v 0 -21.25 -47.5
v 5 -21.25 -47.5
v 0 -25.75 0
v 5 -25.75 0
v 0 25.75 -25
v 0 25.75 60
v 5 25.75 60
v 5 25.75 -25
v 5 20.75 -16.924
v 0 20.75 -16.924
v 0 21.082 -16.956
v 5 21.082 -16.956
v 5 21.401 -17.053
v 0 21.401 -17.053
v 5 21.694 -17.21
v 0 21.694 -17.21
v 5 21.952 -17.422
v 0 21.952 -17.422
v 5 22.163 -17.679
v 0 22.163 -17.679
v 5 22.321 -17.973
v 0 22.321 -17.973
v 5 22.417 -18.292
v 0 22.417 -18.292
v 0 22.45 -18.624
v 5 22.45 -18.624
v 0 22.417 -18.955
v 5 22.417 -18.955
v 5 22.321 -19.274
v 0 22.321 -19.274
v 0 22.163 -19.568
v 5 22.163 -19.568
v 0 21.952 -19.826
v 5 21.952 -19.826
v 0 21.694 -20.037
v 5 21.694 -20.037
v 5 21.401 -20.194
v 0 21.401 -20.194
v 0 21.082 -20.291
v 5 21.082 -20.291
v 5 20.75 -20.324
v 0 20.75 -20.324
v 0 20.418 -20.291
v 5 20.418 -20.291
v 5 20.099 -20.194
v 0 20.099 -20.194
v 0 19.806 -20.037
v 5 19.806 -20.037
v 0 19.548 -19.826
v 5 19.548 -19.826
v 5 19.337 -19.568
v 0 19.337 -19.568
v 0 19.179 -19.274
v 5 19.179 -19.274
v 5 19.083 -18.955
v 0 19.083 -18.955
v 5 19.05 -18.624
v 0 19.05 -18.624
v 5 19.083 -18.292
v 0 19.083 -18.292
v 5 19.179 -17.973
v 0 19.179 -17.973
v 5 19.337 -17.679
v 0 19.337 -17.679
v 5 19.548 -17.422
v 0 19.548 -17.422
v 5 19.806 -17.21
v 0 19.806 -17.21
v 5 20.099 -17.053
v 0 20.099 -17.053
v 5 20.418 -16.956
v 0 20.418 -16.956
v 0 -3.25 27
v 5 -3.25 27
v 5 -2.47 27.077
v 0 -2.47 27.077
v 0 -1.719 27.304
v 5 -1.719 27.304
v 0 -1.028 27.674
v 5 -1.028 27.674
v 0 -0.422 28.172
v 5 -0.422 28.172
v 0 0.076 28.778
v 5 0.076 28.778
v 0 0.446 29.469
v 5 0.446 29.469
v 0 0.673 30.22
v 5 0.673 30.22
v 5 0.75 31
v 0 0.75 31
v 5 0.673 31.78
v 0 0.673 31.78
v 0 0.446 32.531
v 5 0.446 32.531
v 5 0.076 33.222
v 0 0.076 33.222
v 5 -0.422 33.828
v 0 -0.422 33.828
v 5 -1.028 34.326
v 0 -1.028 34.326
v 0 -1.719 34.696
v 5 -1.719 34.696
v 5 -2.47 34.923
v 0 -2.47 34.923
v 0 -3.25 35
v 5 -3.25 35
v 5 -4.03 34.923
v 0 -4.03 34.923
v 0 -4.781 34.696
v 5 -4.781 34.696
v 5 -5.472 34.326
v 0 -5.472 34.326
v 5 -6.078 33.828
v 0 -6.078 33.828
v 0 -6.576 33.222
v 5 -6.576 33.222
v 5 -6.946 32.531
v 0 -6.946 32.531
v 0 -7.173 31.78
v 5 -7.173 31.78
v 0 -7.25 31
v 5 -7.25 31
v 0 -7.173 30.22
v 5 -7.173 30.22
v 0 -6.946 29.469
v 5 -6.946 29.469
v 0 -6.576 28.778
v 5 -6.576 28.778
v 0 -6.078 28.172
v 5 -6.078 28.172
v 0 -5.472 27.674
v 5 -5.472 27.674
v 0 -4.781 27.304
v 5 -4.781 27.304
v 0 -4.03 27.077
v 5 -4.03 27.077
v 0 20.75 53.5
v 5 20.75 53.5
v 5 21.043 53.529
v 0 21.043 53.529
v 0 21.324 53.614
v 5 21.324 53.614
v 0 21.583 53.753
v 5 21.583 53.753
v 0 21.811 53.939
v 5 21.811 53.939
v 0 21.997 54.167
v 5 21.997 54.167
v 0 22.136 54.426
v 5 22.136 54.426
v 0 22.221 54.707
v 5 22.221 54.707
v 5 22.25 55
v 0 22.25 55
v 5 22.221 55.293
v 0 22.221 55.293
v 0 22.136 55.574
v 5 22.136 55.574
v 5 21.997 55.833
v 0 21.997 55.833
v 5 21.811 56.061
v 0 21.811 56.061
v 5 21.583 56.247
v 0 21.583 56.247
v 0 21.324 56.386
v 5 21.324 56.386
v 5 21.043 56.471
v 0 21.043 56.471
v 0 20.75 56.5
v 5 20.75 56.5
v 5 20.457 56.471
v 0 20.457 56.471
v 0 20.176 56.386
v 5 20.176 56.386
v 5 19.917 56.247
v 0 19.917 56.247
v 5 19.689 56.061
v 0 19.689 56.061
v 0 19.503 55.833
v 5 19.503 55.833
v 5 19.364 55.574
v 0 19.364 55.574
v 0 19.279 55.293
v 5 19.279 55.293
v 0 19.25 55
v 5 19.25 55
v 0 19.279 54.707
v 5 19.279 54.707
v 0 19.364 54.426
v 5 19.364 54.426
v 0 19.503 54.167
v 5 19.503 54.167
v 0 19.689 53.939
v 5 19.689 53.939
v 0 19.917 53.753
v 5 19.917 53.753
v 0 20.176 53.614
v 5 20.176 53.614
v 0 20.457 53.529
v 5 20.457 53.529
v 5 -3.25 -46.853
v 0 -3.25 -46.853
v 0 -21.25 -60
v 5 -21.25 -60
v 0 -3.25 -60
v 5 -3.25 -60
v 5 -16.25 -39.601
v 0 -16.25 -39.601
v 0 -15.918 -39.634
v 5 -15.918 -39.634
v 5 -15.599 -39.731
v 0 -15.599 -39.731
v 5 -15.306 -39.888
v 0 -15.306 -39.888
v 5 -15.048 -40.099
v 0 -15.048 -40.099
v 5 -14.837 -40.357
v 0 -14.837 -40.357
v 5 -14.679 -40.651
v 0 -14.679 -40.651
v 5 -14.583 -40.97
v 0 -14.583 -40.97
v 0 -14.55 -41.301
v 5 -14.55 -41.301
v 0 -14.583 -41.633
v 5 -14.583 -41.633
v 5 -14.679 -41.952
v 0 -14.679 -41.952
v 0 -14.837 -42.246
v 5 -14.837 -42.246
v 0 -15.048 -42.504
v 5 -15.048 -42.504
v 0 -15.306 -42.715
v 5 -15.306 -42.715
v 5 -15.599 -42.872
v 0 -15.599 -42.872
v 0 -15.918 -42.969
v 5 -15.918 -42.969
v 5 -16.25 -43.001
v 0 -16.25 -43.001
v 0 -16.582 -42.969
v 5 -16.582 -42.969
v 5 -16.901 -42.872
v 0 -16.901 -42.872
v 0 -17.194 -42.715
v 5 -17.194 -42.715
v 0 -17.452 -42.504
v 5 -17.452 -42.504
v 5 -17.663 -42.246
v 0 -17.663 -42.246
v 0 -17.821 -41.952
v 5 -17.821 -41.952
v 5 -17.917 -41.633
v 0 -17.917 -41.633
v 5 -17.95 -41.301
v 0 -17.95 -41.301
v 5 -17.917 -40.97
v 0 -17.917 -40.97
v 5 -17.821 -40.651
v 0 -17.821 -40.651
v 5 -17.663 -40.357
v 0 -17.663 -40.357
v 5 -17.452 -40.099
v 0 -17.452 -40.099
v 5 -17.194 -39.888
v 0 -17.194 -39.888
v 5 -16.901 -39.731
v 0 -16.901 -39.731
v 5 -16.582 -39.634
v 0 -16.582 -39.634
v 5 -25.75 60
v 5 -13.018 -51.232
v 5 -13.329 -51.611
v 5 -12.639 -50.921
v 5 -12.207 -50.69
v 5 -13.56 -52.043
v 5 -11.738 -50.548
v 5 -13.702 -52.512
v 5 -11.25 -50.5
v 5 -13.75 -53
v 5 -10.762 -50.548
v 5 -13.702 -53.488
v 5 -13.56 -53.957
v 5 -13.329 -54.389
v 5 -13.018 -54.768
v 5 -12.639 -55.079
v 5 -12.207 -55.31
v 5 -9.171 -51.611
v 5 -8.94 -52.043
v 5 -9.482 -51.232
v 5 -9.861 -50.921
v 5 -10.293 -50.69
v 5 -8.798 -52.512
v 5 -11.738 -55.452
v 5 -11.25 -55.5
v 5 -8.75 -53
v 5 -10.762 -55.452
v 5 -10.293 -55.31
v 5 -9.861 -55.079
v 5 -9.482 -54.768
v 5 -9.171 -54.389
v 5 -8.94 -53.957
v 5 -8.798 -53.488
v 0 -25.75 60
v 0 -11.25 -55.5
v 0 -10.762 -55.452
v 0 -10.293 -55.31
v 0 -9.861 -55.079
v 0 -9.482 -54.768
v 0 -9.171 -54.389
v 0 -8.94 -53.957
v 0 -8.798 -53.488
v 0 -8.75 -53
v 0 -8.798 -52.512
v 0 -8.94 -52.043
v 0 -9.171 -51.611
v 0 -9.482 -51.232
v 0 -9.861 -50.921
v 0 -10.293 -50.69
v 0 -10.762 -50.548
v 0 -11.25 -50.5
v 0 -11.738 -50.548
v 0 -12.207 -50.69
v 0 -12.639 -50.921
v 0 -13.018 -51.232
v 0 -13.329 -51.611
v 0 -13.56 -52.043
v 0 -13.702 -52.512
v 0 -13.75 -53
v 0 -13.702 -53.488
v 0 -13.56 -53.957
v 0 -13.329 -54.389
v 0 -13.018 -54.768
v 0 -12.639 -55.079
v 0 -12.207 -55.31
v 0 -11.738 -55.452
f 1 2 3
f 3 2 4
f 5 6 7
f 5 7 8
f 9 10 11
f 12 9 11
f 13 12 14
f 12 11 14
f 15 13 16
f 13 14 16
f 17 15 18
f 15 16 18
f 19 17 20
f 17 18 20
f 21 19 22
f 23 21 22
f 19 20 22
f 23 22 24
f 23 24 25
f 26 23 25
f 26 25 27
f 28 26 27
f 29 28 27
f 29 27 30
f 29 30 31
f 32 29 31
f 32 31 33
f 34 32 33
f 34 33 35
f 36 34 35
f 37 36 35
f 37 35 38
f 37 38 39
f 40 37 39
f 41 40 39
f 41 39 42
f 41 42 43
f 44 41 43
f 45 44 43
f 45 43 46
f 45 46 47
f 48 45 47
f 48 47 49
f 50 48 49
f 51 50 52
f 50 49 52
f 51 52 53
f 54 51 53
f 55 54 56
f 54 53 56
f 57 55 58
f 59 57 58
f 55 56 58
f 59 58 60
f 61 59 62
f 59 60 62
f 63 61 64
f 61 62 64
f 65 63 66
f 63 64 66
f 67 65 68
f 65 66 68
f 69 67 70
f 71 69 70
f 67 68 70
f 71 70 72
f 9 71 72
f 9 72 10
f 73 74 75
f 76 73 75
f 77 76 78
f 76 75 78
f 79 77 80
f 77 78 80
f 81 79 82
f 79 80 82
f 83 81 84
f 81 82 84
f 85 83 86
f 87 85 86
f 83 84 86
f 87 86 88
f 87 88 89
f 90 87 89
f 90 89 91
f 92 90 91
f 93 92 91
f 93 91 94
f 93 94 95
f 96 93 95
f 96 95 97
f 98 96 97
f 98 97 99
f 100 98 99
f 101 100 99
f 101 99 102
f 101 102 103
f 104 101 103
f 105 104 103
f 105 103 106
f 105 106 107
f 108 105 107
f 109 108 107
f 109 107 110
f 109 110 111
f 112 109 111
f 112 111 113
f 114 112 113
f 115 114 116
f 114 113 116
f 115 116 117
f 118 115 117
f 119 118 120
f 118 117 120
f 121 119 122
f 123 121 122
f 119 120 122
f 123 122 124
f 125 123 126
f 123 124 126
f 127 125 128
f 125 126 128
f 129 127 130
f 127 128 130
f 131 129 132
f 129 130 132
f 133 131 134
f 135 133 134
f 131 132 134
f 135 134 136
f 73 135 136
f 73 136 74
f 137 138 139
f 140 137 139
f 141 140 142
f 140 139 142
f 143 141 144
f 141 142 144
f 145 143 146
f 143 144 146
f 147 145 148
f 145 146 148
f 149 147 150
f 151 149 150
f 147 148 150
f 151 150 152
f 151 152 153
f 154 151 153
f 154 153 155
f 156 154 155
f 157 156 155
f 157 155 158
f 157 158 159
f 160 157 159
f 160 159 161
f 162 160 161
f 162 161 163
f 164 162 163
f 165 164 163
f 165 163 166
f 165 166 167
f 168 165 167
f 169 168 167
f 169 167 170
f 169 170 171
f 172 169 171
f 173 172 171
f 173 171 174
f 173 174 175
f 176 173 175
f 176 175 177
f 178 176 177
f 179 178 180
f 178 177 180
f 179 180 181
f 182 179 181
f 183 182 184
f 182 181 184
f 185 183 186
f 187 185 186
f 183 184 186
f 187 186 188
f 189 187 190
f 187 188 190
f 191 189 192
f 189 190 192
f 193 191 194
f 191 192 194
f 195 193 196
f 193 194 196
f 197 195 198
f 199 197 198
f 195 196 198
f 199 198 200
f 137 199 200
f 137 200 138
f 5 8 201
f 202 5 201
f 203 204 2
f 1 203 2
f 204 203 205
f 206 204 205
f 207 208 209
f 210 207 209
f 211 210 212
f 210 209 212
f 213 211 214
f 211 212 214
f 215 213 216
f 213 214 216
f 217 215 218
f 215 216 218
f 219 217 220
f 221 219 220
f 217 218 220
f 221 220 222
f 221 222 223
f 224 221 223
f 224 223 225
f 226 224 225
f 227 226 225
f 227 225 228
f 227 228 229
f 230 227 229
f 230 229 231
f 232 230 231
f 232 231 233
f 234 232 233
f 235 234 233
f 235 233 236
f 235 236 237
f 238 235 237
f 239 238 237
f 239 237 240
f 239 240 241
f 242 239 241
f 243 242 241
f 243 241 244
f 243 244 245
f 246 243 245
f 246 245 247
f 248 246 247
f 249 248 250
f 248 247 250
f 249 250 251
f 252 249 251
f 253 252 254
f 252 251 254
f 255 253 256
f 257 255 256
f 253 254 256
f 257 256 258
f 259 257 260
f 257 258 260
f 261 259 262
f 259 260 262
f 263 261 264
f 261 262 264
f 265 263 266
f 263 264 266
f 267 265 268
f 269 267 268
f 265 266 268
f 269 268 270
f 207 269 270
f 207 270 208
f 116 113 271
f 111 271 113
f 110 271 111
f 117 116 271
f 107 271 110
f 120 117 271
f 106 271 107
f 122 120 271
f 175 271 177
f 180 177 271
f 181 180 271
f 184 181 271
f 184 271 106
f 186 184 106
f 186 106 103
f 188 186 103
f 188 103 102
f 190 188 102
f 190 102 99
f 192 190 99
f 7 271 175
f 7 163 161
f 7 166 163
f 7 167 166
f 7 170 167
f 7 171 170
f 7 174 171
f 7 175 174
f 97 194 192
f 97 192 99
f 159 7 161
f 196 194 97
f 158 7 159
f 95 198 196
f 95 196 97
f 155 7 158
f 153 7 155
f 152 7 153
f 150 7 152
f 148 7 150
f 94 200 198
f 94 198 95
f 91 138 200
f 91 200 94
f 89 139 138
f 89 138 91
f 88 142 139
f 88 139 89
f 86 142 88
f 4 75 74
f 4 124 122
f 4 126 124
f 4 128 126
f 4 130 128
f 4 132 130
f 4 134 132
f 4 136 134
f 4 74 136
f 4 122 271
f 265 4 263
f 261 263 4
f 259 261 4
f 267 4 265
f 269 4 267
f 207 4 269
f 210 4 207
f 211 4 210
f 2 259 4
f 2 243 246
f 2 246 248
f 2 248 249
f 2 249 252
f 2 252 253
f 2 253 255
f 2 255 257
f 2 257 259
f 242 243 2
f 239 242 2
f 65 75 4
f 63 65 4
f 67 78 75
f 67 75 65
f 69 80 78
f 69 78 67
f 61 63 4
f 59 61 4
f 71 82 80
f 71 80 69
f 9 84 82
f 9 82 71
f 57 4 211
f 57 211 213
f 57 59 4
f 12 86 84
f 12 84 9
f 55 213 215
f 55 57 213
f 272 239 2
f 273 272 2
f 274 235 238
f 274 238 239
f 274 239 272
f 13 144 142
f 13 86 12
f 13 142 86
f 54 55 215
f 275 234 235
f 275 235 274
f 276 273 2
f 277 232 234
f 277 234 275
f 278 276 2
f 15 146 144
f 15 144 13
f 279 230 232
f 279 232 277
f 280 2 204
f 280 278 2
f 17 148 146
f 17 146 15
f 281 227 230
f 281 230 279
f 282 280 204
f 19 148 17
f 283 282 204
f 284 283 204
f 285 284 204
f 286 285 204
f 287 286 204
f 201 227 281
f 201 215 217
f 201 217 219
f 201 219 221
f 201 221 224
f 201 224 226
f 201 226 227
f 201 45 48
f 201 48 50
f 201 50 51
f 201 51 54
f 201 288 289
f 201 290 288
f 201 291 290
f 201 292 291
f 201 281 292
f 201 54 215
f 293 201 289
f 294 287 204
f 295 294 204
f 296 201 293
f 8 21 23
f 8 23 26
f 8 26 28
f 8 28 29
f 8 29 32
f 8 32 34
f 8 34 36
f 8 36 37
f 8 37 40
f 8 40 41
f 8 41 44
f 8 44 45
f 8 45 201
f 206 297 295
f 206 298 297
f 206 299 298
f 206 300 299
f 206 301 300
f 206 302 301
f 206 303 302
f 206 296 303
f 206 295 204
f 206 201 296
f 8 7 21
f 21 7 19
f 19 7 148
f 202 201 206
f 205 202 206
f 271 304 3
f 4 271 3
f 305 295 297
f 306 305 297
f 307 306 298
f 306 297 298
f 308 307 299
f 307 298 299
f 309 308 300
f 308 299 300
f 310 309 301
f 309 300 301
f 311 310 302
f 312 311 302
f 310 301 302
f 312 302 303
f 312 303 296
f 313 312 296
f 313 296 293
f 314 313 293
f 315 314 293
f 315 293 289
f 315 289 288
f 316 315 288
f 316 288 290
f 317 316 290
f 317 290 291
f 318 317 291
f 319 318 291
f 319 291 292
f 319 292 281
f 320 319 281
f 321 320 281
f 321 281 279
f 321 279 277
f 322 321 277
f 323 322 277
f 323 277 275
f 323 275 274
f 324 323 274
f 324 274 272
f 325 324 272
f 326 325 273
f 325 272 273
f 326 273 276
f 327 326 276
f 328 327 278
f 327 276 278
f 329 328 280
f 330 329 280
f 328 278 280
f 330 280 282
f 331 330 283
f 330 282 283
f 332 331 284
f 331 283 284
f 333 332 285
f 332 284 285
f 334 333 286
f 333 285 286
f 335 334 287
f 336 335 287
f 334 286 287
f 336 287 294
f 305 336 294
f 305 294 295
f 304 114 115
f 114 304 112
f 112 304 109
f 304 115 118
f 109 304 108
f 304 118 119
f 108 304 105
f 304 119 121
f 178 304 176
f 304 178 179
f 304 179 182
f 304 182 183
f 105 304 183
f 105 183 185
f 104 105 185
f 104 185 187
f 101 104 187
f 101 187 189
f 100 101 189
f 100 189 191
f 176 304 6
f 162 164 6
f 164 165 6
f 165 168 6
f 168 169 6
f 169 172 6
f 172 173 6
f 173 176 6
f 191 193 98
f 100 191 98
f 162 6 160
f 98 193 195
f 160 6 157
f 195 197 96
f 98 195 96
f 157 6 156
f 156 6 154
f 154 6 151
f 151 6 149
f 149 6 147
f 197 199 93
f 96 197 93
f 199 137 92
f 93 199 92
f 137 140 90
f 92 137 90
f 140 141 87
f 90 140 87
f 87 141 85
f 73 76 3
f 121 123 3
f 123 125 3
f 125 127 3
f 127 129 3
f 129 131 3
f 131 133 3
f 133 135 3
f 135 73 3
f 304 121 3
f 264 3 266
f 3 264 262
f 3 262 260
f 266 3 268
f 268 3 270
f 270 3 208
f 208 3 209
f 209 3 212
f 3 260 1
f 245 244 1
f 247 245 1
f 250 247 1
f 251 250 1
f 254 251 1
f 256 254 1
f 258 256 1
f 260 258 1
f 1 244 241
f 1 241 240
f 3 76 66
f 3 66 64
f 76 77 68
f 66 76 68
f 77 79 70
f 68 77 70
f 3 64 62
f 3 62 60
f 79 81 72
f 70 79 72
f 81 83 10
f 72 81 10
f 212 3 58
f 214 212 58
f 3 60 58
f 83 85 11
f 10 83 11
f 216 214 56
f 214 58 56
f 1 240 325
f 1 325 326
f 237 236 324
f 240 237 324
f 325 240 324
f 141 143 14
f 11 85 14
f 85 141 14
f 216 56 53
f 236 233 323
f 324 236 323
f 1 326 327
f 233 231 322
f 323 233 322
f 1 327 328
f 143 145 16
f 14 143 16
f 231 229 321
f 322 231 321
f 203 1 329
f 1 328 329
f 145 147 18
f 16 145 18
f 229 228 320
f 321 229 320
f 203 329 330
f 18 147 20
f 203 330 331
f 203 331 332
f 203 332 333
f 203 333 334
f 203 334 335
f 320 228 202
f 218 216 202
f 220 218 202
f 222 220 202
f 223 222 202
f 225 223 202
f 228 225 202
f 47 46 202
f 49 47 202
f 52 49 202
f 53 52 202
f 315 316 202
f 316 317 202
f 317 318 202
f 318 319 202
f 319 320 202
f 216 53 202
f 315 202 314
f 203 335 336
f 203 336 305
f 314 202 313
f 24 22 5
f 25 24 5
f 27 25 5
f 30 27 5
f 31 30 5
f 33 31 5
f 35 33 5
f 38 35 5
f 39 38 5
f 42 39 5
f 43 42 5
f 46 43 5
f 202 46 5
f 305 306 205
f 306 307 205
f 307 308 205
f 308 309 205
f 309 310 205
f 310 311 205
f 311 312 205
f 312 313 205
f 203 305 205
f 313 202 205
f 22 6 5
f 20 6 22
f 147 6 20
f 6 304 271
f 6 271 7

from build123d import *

# Parameters (mm, degrees)
CROQUIS1_W              = 120
CROQUIS1_H              = 51.5
SALIENTE_EXTRUIR1_DEPTH = 5
CORTAR_EXTRUIR1_REACH   = 7
CORTAR_EXTRUIR2_REACH   = 7
CROQUIS3_R              = 1.5
CROQUIS3_R_2            = 4
CORTAR_EXTRUIR3_REACH   = 7
CROQUIS4_R              = 1.7
CORTAR_EXTRUIR4_REACH   = 7
CROQUIS9_R              = 2.5
CORTAR_EXTRUIR8_DEPTH   = 10


with BuildPart() as part:
    # Croquis1 → Saliente-Extruir1 (new body)
    with BuildSketch(Plane(origin=(0, 0, 0), x_dir=(0, 0, -1), z_dir=(1, 0, 0))):
        Rectangle(CROQUIS1_W, CROQUIS1_H)
    extrude(amount=SALIENTE_EXTRUIR1_DEPTH)

    # Croquis2 → Cortar-Extruir1 (cut, up to next)
    with BuildSketch(Plane(origin=(5, 0, 0), x_dir=(0, 0, -1), z_dir=(1, 0, 0)), mode=Mode.PRIVATE) as cortar_extruir1_sk1:
        Polygon((25, 25.75), (46.853067453, -3.25), (60, -3.25), (60, 25.75), align=None)
    cortar_extruir1_tool1 = extrude(cortar_extruir1_sk1.sketch, amount=-CORTAR_EXTRUIR1_REACH, mode=Mode.PRIVATE) & part.part
    add(cortar_extruir1_tool1.solids().sort_by_distance((5, 13.443767, -47.136706))[0], mode=Mode.SUBTRACT)

    # Croquis3 → Cortar-Extruir2 (cut, up to next)
    with BuildSketch(Plane(origin=(5, 0, 0), x_dir=(0, 0, -1), z_dir=(1, 0, 0)), mode=Mode.PRIVATE) as cortar_extruir2_sk1:
        with Locations((-55, 20.75)):
            Circle(CROQUIS3_R)
    cortar_extruir2_tool1 = extrude(cortar_extruir2_sk1.sketch, amount=-CORTAR_EXTRUIR2_REACH, mode=Mode.PRIVATE) & part.part
    add(cortar_extruir2_tool1.solids().sort_by_distance((5, 20.75, 55))[0], mode=Mode.SUBTRACT)
    # Croquis3 → Cortar-Extruir2 (cut, up to next)
    with BuildSketch(Plane(origin=(5, 0, 0), x_dir=(0, 0, -1), z_dir=(1, 0, 0)), mode=Mode.PRIVATE) as cortar_extruir2_sk2:
        with Locations((-31, -3.25)):
            Circle(CROQUIS3_R_2)
    cortar_extruir2_tool2 = extrude(cortar_extruir2_sk2.sketch, amount=-CORTAR_EXTRUIR2_REACH, mode=Mode.PRIVATE) & part.part
    add(cortar_extruir2_tool2.solids().sort_by_distance((5, -3.25, 31))[0], mode=Mode.SUBTRACT)

    # Croquis4 → Cortar-Extruir3 (cut, up to next)
    with BuildSketch(Plane.ZY, mode=Mode.PRIVATE) as cortar_extruir3_sk1:
        with Locations((-18.623723721, 20.75)):
            Circle(CROQUIS4_R)
    cortar_extruir3_tool1 = extrude(cortar_extruir3_sk1.sketch, amount=-CORTAR_EXTRUIR3_REACH, mode=Mode.PRIVATE) & part.part
    add(cortar_extruir3_tool1.solids().sort_by_distance((0, 20.75, -18.623724))[0], mode=Mode.SUBTRACT)
    # Croquis4 → Cortar-Extruir3 (cut, up to next)
    with BuildSketch(Plane.ZY, mode=Mode.PRIVATE) as cortar_extruir3_sk2:
        with Locations((-41.301477372, -16.25)):
            Circle(CROQUIS4_R)
    cortar_extruir3_tool2 = extrude(cortar_extruir3_sk2.sketch, amount=-CORTAR_EXTRUIR3_REACH, mode=Mode.PRIVATE) & part.part
    add(cortar_extruir3_tool2.solids().sort_by_distance((0, -16.25, -41.301477))[0], mode=Mode.SUBTRACT)

    # Croquis5 → Cortar-Extruir4 (cut, up to next)
    with BuildSketch(Plane(origin=(5, 0, 0), x_dir=(0, 0, -1), z_dir=(1, 0, 0)), mode=Mode.PRIVATE) as cortar_extruir4_sk1:
        Polygon((47.5, -21.25), (0, -25.75), (47.5, -25.75), (60, -25.75), (60, -21.25), align=None)
    cortar_extruir4_tool1 = extrude(cortar_extruir4_sk1.sketch, amount=-CORTAR_EXTRUIR4_REACH, mode=Mode.PRIVATE) & part.part
    add(cortar_extruir4_tool1.solids().sort_by_distance((5, -23.991379, -39.281609))[0], mode=Mode.SUBTRACT)

    # Croquis9 → Cortar-Extruir8 (cut)
    with BuildSketch(Plane(origin=(5, 0, 0), x_dir=(0, 0, -1), z_dir=(1, 0, 0))):
        with Locations((53, -11.25)):
            Circle(CROQUIS9_R)
    extrude(amount=-CORTAR_EXTRUIR8_DEPTH, mode=Mode.SUBTRACT)


solid = part.part
